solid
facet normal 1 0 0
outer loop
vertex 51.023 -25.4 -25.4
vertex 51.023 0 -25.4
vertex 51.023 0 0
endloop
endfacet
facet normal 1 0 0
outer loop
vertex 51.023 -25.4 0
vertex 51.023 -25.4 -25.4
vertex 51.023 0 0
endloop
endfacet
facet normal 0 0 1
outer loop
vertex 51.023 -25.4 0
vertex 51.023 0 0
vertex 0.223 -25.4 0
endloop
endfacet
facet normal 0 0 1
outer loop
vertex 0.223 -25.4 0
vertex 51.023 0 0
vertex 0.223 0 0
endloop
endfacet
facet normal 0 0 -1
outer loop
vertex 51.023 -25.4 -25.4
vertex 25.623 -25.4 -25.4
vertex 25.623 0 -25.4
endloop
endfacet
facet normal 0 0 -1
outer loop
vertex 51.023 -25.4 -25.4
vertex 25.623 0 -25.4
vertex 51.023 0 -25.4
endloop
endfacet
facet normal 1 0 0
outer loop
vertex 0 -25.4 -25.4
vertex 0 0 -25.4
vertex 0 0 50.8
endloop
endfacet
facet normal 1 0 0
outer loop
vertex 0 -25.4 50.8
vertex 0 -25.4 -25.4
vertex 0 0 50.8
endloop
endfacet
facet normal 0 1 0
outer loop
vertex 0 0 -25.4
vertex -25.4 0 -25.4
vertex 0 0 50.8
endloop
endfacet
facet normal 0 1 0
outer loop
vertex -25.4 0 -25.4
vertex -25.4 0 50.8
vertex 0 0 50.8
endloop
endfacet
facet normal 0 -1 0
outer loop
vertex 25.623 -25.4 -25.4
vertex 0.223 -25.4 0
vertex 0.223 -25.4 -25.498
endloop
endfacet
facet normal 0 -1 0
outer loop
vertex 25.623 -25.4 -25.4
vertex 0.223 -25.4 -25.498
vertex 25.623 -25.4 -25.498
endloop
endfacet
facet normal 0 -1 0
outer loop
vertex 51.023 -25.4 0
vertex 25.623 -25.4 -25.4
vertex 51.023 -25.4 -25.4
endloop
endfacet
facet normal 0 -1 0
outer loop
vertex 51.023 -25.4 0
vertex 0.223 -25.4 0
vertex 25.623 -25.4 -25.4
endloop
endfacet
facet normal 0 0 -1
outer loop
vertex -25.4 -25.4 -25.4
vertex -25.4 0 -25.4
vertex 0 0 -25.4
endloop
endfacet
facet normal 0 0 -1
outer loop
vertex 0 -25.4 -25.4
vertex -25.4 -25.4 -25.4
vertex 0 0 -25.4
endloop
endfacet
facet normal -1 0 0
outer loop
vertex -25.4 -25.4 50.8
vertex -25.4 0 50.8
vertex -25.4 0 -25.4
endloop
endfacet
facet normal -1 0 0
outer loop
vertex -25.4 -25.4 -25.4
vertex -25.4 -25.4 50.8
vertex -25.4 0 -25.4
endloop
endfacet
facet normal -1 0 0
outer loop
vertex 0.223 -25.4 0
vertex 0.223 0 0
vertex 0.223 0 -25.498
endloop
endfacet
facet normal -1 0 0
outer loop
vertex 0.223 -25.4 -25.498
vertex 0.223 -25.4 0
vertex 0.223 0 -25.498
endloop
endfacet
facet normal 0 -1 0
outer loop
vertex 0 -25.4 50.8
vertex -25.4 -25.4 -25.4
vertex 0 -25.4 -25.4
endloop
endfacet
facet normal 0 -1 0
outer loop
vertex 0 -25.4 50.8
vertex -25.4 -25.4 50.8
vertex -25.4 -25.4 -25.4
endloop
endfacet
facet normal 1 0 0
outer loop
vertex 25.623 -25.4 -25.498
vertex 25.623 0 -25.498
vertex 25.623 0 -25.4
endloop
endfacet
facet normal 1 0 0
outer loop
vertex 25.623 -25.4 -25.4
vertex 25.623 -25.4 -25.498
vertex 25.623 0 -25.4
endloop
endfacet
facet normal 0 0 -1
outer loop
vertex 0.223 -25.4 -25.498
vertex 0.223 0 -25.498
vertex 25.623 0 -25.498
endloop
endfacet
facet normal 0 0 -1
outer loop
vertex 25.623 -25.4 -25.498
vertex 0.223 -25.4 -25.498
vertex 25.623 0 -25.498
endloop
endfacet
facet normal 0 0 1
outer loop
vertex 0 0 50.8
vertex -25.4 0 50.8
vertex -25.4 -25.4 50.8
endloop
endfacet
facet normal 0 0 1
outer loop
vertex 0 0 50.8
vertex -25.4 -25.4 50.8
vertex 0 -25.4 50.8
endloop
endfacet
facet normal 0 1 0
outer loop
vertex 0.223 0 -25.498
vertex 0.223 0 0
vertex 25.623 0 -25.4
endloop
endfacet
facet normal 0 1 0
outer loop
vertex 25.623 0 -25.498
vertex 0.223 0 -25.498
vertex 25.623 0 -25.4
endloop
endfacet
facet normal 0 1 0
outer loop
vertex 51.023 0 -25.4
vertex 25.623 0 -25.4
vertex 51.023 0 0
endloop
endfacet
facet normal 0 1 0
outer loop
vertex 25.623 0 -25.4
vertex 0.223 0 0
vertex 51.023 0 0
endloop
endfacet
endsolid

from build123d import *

# Parameters (mm, degrees)
F0_W     = 25.4
F0_H     = 25.4
F1_DEPTH = 25.4


with BuildPart() as f1:
    # F0 (on Front) → F1 (new body)
    with BuildSketch(Plane.XZ):
        with Locations((-12.7, -12.7)):
            Rectangle(F0_W, F0_H)
        with Locations((-12.7, 12.7)):
            Rectangle(F0_W, F0_H)
        with Locations((-12.7, 38.1)):
            Rectangle(F0_W, F0_H)
        Polygon((25.623299, 0), (0.223299, 0), (0.223299, -25.497694), (25.623299, -25.497694), (25.623299, -25.4), align=None)
        with Locations((38.323299, -12.7)):
            Rectangle(F0_W, F0_H)
    extrude(amount=F1_DEPTH)


solid = f1.part
